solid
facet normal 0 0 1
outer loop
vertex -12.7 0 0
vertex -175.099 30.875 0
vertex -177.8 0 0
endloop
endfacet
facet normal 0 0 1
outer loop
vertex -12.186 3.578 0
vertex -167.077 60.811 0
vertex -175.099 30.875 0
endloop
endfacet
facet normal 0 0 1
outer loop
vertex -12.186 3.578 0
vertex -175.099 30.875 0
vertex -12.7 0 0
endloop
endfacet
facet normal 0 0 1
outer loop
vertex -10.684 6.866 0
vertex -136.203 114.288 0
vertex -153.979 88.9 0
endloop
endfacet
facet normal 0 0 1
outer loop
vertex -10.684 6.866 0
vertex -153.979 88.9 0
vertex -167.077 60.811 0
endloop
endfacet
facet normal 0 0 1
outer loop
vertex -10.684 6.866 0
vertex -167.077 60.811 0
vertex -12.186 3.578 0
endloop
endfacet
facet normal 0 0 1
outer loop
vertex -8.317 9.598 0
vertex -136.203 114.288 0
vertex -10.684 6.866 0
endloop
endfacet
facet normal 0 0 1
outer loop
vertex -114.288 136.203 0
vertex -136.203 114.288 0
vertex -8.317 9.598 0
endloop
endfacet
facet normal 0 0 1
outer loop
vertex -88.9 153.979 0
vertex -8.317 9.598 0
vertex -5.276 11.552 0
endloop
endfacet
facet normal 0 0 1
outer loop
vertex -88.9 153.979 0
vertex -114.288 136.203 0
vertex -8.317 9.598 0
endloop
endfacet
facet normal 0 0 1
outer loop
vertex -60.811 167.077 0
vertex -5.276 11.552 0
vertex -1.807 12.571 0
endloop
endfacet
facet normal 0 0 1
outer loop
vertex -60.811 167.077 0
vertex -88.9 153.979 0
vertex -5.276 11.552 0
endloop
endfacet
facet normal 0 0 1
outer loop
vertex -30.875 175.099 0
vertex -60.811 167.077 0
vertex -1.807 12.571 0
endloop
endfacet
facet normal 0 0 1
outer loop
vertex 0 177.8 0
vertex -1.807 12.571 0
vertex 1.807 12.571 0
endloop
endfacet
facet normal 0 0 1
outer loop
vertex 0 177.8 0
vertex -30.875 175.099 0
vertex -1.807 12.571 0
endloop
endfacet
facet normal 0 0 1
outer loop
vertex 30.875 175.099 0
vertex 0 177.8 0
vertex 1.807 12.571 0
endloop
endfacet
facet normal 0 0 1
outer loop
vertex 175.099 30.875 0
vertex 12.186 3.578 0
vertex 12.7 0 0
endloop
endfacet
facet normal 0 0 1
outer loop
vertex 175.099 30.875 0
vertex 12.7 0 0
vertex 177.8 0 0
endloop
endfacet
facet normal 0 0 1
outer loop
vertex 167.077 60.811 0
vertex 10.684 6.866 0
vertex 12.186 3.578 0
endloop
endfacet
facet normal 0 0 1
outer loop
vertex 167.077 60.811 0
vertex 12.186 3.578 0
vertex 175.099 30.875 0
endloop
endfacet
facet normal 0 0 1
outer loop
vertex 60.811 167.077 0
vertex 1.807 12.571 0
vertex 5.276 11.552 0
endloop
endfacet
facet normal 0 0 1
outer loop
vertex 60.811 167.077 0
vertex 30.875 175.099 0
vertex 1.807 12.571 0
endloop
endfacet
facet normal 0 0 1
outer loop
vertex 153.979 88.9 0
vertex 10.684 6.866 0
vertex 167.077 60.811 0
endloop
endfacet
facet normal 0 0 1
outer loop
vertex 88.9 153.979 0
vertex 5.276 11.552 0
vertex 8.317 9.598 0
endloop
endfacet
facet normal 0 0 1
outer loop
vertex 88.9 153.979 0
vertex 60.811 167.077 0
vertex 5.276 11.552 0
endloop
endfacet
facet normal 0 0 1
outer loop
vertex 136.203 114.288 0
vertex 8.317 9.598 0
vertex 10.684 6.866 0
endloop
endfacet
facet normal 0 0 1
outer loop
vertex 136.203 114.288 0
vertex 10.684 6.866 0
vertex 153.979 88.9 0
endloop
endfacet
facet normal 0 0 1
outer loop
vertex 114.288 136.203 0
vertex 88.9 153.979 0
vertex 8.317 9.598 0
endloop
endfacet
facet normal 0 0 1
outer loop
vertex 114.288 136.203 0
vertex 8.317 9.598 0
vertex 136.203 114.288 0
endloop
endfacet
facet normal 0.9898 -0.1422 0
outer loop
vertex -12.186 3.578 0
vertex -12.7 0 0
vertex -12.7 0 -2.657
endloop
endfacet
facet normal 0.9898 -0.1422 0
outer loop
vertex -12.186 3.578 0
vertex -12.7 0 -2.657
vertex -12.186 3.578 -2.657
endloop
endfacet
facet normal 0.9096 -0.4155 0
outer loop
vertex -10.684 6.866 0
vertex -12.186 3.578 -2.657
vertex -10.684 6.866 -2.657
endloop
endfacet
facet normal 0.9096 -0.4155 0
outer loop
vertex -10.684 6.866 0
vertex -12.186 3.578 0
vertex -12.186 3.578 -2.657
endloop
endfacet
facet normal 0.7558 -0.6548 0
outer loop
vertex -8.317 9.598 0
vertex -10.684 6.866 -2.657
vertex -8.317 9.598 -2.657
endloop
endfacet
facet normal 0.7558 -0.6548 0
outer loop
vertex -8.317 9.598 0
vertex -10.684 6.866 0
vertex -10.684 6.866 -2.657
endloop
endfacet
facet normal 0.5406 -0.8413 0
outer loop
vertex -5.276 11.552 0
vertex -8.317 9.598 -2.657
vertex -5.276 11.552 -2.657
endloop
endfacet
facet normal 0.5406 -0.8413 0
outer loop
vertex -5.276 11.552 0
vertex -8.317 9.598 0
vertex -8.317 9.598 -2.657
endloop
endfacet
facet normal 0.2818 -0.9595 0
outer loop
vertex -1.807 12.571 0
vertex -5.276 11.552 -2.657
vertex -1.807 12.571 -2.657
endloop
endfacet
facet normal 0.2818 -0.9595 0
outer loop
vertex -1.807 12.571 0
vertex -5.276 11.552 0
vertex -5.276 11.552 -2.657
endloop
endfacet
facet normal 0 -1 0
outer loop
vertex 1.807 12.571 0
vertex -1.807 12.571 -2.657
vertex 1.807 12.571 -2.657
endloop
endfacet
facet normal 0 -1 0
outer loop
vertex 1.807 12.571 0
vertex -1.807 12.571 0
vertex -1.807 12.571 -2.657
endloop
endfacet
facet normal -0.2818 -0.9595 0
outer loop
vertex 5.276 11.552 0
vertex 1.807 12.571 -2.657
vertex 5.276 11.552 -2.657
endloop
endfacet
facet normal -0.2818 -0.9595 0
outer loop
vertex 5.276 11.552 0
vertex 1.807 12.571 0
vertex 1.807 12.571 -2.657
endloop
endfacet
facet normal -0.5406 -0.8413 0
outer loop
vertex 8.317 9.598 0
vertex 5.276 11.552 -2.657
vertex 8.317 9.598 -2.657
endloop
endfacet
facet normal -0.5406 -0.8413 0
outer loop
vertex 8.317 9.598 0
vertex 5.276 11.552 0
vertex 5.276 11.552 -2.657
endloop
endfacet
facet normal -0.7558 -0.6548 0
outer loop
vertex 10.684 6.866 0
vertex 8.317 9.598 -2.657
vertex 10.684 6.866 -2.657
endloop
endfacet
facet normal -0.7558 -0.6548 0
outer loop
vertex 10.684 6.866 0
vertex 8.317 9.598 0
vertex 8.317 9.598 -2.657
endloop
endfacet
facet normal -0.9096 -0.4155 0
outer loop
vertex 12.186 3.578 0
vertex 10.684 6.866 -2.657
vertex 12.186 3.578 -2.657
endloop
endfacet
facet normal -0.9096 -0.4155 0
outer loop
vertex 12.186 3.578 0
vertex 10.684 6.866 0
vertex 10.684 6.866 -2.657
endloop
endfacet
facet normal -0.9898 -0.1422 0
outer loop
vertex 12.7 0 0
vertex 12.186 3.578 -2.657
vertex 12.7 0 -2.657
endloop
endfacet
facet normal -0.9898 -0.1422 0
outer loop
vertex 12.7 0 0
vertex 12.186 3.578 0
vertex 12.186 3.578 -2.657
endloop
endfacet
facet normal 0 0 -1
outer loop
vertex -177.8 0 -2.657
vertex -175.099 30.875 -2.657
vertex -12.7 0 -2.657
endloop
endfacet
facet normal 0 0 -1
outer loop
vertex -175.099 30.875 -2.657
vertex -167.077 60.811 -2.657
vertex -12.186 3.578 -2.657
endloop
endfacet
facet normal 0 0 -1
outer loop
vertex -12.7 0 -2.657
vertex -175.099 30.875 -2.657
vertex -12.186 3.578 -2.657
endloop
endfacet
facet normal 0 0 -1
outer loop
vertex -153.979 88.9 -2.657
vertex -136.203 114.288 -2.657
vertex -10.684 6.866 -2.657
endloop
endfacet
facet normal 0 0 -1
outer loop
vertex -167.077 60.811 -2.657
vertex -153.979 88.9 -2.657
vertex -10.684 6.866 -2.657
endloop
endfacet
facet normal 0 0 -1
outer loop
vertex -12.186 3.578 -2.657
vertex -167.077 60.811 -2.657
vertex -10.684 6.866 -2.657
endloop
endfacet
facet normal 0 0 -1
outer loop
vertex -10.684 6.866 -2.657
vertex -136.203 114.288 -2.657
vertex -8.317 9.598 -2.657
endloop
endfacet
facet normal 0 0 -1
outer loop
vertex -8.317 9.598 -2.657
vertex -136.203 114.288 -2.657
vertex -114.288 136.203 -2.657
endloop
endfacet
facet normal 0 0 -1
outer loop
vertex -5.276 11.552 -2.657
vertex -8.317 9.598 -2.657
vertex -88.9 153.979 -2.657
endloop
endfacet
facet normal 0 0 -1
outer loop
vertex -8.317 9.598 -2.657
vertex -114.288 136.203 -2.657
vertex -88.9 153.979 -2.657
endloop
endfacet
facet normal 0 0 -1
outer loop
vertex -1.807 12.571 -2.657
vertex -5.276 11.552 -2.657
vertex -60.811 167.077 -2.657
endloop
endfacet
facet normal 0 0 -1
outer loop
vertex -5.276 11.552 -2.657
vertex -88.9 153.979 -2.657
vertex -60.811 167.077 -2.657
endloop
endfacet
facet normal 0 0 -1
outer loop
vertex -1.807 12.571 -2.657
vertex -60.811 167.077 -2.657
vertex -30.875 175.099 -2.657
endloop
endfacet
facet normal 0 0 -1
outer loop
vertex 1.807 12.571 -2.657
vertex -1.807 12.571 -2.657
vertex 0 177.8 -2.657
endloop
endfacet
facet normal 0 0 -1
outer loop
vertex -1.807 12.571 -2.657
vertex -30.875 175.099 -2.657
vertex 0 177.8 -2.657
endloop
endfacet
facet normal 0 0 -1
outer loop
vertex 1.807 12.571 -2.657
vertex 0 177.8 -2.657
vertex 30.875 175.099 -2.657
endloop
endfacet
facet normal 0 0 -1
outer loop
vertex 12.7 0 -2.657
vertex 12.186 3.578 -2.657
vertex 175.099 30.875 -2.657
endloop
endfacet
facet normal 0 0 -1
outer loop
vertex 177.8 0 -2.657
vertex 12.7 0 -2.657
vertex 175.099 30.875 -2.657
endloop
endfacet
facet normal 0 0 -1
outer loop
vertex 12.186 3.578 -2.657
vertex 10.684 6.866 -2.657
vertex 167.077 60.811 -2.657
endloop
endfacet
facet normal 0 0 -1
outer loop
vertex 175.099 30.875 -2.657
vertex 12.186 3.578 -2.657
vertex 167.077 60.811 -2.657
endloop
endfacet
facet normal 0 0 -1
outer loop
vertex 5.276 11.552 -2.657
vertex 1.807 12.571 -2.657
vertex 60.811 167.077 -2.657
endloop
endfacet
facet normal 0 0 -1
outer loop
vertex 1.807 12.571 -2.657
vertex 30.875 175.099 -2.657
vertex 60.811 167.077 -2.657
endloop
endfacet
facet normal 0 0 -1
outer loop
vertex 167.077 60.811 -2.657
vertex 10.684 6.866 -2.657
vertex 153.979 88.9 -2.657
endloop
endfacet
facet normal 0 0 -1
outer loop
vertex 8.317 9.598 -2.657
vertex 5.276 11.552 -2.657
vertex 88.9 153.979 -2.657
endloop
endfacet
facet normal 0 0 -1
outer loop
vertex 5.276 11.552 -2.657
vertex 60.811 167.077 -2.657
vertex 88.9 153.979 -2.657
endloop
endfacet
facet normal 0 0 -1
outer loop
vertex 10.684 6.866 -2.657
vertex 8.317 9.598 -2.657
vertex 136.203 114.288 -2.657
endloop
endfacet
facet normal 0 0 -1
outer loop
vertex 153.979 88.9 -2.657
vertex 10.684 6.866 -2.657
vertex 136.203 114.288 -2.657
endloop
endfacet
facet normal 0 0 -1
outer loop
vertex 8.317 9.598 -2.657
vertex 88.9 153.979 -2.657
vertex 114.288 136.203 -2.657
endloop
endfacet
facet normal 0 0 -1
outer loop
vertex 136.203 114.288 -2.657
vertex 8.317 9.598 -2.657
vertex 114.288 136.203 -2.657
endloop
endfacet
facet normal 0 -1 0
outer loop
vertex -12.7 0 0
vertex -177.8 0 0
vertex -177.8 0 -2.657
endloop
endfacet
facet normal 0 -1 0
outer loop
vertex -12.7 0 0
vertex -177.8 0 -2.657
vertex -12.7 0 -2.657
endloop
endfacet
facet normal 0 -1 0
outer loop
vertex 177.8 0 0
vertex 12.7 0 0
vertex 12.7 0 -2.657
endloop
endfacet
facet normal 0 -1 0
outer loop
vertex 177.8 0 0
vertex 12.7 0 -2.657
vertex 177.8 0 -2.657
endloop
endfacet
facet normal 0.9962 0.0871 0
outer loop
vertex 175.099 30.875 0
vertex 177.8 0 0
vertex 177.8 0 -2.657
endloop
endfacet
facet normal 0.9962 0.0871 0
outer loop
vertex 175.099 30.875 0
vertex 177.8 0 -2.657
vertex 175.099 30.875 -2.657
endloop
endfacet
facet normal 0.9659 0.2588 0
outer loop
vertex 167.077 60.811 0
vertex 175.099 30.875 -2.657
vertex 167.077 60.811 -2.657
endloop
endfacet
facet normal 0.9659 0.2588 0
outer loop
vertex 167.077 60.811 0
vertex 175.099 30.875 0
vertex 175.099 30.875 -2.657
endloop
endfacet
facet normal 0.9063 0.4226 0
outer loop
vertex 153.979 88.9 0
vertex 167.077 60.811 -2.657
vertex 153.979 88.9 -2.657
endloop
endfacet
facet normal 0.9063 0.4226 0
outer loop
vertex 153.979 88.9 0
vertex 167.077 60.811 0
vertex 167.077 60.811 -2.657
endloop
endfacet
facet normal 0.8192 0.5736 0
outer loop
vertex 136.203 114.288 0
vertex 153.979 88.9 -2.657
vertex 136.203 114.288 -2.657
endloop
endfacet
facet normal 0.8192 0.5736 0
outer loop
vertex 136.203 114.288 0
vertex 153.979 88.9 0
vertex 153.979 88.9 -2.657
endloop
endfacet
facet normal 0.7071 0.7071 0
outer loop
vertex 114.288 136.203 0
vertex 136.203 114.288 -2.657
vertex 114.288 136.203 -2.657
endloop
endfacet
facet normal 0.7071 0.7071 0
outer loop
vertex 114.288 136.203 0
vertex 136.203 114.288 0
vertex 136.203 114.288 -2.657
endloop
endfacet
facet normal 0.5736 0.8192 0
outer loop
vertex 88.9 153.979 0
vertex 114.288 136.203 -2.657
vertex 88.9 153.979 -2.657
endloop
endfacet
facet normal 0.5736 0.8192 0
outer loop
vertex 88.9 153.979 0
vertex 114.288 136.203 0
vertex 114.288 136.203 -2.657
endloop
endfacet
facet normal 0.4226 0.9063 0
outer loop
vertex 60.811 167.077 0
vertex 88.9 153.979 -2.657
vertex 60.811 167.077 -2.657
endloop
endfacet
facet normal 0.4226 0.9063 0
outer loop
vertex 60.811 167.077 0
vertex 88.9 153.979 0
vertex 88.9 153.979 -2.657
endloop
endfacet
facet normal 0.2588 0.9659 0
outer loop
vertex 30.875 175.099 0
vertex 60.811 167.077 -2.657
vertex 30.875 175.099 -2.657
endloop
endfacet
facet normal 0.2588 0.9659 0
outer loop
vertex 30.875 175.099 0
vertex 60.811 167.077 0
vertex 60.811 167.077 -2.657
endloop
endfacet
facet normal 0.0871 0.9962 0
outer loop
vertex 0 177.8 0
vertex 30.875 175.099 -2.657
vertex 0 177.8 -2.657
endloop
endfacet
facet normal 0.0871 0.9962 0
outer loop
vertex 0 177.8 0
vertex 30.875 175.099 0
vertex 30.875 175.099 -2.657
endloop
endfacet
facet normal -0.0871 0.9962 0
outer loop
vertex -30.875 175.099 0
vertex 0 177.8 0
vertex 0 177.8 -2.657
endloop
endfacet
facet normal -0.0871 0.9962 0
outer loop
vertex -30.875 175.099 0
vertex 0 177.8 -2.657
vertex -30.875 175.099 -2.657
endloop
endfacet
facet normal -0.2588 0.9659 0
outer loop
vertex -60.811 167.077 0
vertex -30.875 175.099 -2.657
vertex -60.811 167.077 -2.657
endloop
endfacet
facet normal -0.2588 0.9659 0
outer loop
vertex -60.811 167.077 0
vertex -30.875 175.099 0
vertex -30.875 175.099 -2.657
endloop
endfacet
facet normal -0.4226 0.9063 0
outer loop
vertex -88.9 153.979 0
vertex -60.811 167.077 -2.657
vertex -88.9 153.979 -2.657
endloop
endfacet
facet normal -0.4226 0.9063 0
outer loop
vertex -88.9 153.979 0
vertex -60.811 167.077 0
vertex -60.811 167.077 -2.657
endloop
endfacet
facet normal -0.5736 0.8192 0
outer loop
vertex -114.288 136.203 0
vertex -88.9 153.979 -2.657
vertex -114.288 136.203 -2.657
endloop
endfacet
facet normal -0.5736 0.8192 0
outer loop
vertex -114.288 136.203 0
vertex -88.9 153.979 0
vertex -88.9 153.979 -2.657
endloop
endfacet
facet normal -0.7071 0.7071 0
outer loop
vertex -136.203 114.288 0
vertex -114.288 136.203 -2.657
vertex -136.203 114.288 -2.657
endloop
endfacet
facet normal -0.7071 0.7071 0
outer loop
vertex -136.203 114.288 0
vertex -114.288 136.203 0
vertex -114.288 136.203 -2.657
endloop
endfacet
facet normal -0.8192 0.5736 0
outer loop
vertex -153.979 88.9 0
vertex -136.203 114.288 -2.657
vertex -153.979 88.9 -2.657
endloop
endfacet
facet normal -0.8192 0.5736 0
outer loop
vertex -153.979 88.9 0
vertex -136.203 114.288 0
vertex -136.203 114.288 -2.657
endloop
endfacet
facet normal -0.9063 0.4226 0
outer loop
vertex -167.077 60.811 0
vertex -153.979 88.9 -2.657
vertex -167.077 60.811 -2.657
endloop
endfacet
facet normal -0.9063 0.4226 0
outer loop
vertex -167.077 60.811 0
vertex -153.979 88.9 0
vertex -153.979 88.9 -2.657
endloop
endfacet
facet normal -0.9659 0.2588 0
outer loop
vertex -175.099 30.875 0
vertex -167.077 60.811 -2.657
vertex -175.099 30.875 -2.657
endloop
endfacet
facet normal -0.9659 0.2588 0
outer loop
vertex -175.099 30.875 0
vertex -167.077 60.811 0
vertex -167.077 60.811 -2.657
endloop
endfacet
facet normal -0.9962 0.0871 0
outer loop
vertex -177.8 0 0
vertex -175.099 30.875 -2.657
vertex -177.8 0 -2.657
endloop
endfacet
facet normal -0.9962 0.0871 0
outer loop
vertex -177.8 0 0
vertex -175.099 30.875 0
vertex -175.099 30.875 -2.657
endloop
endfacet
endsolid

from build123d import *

# Parameters (mm, degrees)
BASE_FLANGE1_DEPTH = 2.65684


# Sheet-metal steps are written as plain solids
with BuildPart() as part:
    # Sketch1 → Base-Flange1 (new body)
    with BuildSketch(Plane.XY):
        with BuildLine():
            Line((-177.8, 0), (-12.7, 0))
            ThreePointArc((-12.7, 0), (0, 12.7), (12.7, 0))
            Line((12.7, 0), (177.8, 0))
            ThreePointArc((177.8, 0), (125.723585695, 125.723585695), (0, 177.8))
            ThreePointArc((0, 177.8), (-125.723585695, 125.723585695), (-177.8, 0))
        make_face()
    extrude(amount=-BASE_FLANGE1_DEPTH)


solid = part.part
